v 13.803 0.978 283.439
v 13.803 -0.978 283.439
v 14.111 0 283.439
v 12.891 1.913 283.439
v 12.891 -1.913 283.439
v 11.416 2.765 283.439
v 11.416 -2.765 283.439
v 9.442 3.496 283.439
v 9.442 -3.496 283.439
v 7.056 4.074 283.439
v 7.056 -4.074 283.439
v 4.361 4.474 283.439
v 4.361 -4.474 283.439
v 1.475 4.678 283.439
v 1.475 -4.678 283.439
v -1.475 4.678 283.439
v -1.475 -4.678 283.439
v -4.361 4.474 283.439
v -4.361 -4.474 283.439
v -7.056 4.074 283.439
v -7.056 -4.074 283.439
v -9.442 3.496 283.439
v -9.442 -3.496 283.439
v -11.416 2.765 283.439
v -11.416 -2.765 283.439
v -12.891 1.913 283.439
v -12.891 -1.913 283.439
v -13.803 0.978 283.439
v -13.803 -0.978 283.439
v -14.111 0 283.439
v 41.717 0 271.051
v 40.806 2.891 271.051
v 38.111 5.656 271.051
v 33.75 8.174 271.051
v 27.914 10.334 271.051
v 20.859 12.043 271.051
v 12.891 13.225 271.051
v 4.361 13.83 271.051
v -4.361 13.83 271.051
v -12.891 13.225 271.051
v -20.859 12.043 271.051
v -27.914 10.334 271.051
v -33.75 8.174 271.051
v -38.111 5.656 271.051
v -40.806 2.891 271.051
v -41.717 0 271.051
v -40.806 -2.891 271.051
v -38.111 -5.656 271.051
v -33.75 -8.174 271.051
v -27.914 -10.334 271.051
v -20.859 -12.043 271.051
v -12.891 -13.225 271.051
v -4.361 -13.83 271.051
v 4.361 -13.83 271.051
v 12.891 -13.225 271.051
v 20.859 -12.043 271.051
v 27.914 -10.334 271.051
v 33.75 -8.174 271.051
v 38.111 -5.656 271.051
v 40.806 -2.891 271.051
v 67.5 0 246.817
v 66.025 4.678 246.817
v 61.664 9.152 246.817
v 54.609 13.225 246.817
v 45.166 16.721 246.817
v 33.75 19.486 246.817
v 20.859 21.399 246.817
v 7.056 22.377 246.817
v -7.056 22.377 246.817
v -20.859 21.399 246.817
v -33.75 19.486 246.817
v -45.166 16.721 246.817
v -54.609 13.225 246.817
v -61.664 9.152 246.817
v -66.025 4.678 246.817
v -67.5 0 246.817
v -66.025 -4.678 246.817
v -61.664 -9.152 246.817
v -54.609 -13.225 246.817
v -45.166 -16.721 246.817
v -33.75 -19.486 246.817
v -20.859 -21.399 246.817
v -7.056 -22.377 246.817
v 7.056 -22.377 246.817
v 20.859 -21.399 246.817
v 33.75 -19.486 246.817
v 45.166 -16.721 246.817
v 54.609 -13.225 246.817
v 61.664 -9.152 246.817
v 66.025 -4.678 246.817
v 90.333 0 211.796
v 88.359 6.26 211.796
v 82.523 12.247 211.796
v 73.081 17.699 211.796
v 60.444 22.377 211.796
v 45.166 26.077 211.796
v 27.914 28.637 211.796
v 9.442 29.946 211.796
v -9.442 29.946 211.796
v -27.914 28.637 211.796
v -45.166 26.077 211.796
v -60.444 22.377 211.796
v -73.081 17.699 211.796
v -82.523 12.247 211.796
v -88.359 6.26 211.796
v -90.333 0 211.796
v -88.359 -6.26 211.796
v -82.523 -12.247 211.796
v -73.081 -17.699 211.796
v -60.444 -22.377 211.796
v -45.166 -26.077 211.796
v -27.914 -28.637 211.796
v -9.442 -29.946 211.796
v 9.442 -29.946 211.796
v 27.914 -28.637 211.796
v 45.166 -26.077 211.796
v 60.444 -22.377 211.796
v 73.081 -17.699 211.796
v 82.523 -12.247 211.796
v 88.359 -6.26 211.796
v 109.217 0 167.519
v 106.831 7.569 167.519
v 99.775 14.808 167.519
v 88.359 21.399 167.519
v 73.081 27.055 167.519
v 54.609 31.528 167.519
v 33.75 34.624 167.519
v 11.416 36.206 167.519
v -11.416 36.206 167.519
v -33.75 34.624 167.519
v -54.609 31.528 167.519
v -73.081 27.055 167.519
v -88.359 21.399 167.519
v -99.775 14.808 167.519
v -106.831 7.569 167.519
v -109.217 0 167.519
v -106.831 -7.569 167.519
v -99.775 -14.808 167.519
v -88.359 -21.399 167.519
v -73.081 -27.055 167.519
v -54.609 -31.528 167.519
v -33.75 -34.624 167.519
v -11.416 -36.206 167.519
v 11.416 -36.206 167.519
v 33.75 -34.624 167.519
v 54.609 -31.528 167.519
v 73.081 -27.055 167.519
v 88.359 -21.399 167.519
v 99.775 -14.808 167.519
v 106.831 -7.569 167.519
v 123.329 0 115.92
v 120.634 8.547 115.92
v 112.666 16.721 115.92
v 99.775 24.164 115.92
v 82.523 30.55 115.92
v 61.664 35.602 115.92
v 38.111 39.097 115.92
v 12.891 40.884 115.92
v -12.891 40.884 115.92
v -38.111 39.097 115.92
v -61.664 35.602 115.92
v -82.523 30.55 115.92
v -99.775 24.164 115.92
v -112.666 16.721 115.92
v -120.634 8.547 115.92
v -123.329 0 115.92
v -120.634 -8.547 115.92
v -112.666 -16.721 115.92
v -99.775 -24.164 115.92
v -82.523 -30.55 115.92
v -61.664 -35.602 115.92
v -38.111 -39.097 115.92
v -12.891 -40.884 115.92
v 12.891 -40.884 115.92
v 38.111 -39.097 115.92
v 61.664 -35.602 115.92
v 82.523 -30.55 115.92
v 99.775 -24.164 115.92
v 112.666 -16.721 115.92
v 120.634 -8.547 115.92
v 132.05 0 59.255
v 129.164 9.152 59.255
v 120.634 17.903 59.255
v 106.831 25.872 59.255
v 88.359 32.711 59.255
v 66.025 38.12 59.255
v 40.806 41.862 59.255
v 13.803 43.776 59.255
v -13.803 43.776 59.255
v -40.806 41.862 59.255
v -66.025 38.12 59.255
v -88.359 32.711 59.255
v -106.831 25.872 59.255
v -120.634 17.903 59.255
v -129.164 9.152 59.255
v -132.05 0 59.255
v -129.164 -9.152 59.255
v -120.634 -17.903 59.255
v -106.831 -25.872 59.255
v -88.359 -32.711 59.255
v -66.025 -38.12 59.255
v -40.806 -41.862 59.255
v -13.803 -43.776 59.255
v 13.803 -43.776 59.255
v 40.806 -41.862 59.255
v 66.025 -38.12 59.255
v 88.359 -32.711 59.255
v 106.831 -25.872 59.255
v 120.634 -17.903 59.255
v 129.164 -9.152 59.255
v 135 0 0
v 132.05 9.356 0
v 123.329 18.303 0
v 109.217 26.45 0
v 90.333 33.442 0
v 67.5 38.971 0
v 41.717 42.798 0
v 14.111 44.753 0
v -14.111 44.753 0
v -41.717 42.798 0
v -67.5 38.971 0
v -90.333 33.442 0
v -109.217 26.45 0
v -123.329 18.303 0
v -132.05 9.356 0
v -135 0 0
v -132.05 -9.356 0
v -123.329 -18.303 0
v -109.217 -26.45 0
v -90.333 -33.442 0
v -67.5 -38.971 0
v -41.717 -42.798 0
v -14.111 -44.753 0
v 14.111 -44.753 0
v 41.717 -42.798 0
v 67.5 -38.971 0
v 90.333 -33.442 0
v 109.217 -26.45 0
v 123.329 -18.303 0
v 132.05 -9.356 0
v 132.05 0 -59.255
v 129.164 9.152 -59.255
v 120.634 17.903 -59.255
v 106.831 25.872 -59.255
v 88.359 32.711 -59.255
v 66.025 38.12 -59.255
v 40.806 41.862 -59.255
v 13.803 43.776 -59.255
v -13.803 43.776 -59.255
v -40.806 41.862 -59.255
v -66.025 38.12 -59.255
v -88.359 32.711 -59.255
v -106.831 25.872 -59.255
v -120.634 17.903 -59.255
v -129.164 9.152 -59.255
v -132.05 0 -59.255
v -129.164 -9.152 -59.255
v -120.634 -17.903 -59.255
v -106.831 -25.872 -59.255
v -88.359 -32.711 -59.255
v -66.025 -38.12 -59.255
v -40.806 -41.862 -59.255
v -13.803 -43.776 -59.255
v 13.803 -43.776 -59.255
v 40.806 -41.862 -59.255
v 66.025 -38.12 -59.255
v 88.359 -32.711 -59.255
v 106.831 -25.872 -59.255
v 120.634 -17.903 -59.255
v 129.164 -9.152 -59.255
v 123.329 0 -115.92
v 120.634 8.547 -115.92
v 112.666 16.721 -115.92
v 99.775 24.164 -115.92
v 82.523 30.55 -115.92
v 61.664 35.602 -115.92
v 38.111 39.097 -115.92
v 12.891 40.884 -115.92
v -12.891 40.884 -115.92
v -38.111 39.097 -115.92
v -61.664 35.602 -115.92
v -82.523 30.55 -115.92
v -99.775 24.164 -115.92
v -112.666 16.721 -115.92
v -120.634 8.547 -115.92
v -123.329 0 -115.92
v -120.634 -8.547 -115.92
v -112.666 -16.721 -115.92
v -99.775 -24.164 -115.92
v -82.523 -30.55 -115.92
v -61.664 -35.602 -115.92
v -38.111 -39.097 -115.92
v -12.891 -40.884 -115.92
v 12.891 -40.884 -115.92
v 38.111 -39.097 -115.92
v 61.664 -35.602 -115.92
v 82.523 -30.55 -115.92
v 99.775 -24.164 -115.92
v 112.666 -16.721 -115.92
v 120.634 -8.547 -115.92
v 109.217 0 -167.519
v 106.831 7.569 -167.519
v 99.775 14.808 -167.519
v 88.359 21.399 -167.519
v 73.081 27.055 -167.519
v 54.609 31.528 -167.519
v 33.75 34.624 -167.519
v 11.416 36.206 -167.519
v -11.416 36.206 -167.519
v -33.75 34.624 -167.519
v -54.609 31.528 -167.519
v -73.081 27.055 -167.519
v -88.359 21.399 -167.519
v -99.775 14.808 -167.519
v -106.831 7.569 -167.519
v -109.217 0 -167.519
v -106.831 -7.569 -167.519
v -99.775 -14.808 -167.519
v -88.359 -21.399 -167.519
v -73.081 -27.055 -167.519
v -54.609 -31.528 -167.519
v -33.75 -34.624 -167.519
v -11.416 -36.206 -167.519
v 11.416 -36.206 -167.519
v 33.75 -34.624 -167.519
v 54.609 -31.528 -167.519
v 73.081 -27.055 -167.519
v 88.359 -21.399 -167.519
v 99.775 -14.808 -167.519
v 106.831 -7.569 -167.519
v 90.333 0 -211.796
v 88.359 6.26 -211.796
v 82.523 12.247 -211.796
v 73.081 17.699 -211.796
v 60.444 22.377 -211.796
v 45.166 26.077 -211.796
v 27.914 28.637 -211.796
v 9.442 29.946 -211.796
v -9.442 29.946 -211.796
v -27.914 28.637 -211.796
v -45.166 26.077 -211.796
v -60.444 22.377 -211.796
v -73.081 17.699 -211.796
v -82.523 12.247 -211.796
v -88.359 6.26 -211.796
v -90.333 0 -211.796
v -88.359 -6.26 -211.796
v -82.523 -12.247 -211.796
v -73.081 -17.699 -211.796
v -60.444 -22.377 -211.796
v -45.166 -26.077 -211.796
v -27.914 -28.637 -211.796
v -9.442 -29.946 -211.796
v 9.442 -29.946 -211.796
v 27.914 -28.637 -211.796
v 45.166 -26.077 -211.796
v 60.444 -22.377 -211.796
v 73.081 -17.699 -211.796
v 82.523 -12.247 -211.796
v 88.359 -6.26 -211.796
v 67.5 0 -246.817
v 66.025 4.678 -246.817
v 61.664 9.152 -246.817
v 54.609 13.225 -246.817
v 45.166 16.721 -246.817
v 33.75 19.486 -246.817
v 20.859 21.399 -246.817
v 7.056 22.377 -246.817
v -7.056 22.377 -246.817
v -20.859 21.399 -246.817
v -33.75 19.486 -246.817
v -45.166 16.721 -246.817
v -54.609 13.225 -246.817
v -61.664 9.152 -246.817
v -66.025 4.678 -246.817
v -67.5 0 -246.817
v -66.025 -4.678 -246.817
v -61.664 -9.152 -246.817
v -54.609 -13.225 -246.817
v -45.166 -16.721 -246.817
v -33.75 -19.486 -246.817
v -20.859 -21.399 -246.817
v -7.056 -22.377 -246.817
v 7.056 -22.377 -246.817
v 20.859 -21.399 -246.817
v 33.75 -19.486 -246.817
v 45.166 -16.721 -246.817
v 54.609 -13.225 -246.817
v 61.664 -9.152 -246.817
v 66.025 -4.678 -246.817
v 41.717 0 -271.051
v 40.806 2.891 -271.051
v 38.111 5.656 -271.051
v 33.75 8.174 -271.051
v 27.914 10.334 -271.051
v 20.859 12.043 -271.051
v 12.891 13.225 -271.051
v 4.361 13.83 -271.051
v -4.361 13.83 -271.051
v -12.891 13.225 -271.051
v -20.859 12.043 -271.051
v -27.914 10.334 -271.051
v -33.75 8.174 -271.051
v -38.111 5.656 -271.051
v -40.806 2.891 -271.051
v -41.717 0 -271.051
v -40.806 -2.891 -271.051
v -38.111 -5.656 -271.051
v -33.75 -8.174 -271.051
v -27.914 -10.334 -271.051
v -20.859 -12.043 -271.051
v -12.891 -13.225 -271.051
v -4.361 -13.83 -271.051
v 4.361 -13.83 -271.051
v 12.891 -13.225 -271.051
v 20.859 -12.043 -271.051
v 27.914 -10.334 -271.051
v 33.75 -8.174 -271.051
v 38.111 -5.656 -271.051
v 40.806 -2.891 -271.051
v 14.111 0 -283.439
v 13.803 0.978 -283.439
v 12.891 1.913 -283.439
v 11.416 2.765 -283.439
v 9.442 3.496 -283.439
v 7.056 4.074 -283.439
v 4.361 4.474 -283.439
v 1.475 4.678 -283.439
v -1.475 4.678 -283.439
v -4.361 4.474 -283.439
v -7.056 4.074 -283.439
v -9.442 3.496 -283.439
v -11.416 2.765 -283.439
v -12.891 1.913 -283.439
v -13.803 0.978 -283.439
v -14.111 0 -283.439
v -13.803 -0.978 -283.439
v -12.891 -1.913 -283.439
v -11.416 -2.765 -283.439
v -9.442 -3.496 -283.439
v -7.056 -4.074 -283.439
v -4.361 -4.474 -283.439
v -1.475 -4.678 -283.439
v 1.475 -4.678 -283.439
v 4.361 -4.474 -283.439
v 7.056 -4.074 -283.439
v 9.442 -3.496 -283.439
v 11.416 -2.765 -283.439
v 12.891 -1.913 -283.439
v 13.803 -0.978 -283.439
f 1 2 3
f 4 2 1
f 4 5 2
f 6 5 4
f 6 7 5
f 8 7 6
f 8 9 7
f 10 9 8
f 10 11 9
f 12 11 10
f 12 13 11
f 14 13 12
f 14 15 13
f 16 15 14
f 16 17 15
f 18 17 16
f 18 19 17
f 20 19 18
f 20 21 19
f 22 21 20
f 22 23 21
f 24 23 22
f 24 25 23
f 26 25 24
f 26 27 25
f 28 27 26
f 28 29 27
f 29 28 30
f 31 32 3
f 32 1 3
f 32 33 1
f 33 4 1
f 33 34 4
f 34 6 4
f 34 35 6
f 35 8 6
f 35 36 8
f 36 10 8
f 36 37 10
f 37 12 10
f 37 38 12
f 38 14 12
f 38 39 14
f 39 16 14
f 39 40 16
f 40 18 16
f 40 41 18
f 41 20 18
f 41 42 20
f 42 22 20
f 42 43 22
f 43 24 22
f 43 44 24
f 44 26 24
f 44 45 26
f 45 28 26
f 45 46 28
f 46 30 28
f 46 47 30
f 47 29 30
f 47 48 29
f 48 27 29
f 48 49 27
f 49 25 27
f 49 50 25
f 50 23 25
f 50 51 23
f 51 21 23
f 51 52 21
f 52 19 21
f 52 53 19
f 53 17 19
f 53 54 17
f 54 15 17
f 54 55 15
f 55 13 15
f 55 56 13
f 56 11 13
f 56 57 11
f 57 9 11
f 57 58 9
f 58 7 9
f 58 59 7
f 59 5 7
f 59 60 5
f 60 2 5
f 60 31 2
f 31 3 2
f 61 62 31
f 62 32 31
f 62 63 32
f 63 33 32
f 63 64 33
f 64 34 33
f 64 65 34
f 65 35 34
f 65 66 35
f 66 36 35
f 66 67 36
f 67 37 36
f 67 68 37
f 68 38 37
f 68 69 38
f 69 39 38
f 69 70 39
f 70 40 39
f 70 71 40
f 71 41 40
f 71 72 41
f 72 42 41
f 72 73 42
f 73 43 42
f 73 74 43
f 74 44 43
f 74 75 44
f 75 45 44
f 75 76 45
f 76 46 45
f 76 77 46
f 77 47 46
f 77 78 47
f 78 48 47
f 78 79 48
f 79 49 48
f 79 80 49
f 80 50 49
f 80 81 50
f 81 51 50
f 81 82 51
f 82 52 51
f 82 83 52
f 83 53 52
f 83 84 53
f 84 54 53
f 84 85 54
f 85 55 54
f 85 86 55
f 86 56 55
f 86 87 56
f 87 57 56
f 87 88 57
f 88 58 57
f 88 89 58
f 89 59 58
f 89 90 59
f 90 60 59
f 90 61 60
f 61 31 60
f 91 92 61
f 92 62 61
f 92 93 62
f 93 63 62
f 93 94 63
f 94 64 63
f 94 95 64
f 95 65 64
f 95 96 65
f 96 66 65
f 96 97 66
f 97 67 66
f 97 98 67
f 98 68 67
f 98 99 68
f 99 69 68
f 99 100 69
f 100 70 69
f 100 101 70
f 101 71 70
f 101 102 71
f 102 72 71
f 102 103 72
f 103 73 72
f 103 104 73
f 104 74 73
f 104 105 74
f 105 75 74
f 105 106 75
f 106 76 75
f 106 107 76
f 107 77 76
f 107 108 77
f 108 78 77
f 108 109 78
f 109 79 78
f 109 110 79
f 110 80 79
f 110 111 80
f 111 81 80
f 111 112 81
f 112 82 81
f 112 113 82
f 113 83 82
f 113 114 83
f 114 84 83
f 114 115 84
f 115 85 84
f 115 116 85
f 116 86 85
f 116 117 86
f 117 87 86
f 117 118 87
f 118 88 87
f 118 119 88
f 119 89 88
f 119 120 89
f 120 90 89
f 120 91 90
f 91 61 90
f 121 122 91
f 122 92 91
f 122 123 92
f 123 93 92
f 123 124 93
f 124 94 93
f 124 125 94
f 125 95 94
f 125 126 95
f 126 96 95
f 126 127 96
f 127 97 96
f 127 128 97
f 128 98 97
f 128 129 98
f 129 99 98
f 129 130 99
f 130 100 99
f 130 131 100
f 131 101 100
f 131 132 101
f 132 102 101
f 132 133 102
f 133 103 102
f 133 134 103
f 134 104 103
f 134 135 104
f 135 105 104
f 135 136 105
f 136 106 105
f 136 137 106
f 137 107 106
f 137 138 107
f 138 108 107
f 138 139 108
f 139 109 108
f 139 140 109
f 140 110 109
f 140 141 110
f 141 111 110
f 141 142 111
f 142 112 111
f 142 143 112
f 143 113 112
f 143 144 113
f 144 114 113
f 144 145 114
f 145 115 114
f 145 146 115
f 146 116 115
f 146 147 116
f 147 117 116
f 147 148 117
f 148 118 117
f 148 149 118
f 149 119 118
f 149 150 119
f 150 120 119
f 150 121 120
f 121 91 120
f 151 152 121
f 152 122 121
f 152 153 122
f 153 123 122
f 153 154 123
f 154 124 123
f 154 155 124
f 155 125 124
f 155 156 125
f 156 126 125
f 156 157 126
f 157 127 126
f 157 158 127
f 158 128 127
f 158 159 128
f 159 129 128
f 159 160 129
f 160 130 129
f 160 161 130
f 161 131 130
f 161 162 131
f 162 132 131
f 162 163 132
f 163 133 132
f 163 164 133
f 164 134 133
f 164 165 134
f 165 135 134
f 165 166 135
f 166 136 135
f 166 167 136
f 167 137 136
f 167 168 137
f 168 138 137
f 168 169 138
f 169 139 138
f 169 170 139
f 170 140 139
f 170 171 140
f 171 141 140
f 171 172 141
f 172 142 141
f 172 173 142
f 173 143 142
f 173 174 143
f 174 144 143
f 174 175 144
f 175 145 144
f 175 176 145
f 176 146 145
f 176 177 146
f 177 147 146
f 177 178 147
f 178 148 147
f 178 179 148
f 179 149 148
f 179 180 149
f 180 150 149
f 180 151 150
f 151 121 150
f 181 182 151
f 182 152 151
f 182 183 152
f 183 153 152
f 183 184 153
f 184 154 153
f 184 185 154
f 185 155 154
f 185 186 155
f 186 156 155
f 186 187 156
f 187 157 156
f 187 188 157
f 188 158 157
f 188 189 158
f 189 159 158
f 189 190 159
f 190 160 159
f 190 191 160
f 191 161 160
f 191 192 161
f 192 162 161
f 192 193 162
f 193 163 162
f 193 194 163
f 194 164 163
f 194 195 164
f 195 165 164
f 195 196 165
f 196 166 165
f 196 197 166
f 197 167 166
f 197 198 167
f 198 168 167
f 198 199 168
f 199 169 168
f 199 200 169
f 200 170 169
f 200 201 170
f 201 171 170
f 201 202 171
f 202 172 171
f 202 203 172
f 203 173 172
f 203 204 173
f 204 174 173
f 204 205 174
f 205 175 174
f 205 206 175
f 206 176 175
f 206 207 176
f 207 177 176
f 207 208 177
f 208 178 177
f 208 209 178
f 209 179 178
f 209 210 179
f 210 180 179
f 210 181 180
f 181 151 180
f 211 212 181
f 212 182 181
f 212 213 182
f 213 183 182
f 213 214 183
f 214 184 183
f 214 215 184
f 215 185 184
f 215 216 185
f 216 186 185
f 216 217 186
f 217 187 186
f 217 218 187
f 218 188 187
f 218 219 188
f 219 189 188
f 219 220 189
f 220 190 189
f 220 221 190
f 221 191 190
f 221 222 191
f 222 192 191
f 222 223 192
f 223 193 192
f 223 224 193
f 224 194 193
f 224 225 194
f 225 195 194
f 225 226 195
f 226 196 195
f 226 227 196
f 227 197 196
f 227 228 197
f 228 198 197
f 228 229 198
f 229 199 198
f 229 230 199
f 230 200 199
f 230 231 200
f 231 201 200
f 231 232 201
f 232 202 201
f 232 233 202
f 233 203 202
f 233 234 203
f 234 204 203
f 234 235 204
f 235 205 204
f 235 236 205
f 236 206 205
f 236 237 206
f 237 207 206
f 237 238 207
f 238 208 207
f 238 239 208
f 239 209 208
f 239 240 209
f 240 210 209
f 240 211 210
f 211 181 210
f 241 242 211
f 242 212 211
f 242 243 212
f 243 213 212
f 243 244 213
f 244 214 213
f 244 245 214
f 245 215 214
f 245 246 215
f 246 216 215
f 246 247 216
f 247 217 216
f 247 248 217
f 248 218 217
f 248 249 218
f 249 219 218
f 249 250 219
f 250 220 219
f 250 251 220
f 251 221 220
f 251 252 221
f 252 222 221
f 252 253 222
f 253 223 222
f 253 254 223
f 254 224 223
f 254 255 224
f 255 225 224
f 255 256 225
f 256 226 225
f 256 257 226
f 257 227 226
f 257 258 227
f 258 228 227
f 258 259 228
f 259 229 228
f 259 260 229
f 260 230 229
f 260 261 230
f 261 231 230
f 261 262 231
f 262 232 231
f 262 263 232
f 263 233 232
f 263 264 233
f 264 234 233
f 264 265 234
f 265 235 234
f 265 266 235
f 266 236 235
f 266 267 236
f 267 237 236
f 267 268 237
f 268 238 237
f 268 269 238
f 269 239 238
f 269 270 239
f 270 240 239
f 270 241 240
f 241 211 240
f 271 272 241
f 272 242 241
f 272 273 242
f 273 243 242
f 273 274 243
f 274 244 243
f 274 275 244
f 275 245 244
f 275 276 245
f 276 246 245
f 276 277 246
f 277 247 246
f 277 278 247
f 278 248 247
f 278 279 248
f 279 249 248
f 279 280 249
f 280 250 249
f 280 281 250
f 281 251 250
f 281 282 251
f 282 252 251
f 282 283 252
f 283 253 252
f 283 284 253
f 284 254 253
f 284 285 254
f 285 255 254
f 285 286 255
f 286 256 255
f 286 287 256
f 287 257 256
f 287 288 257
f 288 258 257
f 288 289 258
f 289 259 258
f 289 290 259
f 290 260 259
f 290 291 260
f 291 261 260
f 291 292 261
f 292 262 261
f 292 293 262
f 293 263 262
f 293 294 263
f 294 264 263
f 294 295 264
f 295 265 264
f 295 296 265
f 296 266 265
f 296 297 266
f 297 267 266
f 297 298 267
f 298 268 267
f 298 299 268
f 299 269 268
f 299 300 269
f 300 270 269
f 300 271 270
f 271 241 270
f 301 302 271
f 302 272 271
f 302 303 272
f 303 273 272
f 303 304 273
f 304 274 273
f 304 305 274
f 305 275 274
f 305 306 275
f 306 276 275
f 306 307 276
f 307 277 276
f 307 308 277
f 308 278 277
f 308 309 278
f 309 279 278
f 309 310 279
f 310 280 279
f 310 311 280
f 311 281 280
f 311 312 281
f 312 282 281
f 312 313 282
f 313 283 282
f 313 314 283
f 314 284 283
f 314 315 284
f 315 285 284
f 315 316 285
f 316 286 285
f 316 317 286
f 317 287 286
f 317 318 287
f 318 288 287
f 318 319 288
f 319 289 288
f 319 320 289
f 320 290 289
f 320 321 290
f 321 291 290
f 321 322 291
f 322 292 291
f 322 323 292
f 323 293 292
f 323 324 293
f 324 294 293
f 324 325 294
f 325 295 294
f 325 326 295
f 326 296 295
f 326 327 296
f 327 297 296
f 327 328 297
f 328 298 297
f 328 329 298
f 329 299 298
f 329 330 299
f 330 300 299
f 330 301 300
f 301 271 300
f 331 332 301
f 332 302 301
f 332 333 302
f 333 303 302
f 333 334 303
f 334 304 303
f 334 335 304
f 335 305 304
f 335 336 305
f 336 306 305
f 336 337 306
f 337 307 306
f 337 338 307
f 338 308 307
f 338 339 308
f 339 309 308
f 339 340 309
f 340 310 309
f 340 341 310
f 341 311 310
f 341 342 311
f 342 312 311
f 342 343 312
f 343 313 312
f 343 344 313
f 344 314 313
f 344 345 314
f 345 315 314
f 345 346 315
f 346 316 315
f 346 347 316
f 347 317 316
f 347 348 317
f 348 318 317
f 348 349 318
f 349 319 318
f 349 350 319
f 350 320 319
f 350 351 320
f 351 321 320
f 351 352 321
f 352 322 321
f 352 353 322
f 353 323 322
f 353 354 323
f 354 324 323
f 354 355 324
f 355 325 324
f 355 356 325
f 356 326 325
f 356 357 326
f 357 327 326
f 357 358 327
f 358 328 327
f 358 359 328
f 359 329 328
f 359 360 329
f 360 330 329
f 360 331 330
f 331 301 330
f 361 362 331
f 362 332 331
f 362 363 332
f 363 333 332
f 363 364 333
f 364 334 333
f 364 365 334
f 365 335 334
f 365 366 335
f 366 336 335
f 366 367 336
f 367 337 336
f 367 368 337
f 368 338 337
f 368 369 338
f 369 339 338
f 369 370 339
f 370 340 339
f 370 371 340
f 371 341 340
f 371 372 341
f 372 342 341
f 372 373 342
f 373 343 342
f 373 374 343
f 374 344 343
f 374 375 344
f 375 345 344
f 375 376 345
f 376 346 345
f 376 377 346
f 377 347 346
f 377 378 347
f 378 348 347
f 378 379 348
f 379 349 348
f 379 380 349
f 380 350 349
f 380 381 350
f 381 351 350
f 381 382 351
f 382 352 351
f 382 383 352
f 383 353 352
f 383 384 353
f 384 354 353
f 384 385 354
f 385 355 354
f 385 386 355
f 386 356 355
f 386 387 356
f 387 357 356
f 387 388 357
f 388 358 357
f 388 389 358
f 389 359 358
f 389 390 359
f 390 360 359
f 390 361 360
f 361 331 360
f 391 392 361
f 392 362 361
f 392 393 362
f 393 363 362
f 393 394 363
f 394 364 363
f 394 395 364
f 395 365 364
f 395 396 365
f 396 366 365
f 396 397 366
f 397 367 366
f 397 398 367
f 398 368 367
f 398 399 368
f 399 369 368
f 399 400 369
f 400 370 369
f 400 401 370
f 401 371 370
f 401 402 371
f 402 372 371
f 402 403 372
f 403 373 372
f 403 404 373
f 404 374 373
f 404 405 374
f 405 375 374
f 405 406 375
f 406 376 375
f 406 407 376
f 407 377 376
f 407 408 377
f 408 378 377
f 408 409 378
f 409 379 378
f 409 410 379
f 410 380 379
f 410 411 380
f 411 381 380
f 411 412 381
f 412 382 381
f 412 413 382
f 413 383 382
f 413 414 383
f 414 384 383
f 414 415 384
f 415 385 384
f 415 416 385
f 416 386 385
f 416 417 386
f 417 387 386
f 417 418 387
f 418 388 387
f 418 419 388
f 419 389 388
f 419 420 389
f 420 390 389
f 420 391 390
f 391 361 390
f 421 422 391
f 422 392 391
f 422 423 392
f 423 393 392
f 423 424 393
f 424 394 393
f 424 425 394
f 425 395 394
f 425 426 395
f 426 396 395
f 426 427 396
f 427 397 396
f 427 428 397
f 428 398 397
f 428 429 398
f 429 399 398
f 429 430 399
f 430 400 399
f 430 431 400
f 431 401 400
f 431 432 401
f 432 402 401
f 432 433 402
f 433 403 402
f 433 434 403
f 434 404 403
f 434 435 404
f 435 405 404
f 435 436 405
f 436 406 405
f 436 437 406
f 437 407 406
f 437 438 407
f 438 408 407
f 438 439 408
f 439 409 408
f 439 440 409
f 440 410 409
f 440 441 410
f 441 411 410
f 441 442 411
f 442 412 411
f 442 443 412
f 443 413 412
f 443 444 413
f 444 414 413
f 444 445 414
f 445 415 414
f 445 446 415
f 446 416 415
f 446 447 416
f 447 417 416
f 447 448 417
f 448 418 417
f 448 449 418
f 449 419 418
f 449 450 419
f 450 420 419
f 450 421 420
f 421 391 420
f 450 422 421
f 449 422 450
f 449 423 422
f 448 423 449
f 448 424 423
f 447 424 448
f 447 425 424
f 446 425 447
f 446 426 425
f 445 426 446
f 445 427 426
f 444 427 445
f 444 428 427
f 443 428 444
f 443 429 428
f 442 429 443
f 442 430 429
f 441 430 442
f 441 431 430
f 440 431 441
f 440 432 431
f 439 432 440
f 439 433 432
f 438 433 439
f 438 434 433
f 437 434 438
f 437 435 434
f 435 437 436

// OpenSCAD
// Generated by SolidPython 1.0.1 on 2020-07-29 00:46:48


scale(v = [9, 3, 19]) {
	sphere(r = 15);
}
/***********************************************
*********      SolidPython code:      **********
************************************************
 
# import packages: SolidPython
from solid import *
from solid.utils import *
from itertools import chain, combinations, permutations


class Resize:

    def __init__(self, scad_file):
        self.scad_file = scad_file
        #self.scad_file = import_scad(scad_file)
        # cone/cylinder param:
        self.r1 = 0
        self.r2 = 0
        self.h = 0
        # rectangular prism param:
        self.w = 0
        self.l = 0
        # ellipse param:
        self.r = 0

    # import OpenScad code (file name corresponds to shape)


    # classify shape + parameters
    def assign(self, param1, param2, param3):
        if self.scad_file == 'cone.scad':
            self.r1 = param1
            self.r2 = param2
            self.h = param3
        elif self.scad_file == 'cylinder.scad':
            self.r1 = param1
            self.r2 = param2
            self.h = param3
        elif self.scad_file == 'rectangularPrism.scad':
            self.h = param1
            self.l = param2
            self.w = param3
        else:
            self.r = param1
            self.h = param2

    # resize parameters
    def iterate(self):
        x = range(3, 20, 2)
        i = 1
        if self.scad_file == 'cone.scad':
            tempList = list(permutations(x, 2))
            for temp in tempList:
                param1 = temp[0]
                param2 = temp[1]
                filepath = 'produced_scad_files/' + 'cone' + str(param1) + '_' + str(param2) + '_' + '.scad'
                scad_render_to_file(cylinder(h=param1, r1=param2, r2=0), filepath)

        elif self.scad_file == 'cylinder.scad':
            tempList = list(permutations(x, 3))
            for temp in tempList:
                param1 = temp[0]
                param2 = temp[1]
                filepath = 'produced_scad_files/' + 'cylinder' + str(param1) + '_' + str(param2) + '_' + '.scad'
                scad_render_to_file(cylinder(h=param1, r1=param2, r2=param2), filepath)

        elif self.scad_file == 'rectangularPrism.scad':
            tempList = list(permutations(x, 3))
            for temp in tempList:
                param1 = temp[0]
                param2 = temp[1]
                param3 = temp[2]
                filepath = 'produced_scad_files/' + 'rectangularPrism' + str(param1) + '_' + str(param2) + '_' + str(
                    param3) + '.scad'
                scad_render_to_file(cube(size=(param1, param2, param3)), filepath)

        elif self.scad_file == 'ellipse.scad':
            tempList = list(permutations(x, 4))
            for temp in tempList:
                param1 = temp[0]
                param2 = temp[1]
                param3 = temp[2]
                param4 = temp[3]
                filepath = 'produced_scad_files/' + 'ellipse' + str(param1) + '_' + str(param2) + '_' + str(param3) + '_' + str(param4) + '.scad'
                scad_render_to_file(scale([param1, param2, param3])(sphere(r=param4)), filepath)

    def render_to_scadfile(self):
        scad_render_to_file(scad, 'example.scad') 
 
************************************************/
